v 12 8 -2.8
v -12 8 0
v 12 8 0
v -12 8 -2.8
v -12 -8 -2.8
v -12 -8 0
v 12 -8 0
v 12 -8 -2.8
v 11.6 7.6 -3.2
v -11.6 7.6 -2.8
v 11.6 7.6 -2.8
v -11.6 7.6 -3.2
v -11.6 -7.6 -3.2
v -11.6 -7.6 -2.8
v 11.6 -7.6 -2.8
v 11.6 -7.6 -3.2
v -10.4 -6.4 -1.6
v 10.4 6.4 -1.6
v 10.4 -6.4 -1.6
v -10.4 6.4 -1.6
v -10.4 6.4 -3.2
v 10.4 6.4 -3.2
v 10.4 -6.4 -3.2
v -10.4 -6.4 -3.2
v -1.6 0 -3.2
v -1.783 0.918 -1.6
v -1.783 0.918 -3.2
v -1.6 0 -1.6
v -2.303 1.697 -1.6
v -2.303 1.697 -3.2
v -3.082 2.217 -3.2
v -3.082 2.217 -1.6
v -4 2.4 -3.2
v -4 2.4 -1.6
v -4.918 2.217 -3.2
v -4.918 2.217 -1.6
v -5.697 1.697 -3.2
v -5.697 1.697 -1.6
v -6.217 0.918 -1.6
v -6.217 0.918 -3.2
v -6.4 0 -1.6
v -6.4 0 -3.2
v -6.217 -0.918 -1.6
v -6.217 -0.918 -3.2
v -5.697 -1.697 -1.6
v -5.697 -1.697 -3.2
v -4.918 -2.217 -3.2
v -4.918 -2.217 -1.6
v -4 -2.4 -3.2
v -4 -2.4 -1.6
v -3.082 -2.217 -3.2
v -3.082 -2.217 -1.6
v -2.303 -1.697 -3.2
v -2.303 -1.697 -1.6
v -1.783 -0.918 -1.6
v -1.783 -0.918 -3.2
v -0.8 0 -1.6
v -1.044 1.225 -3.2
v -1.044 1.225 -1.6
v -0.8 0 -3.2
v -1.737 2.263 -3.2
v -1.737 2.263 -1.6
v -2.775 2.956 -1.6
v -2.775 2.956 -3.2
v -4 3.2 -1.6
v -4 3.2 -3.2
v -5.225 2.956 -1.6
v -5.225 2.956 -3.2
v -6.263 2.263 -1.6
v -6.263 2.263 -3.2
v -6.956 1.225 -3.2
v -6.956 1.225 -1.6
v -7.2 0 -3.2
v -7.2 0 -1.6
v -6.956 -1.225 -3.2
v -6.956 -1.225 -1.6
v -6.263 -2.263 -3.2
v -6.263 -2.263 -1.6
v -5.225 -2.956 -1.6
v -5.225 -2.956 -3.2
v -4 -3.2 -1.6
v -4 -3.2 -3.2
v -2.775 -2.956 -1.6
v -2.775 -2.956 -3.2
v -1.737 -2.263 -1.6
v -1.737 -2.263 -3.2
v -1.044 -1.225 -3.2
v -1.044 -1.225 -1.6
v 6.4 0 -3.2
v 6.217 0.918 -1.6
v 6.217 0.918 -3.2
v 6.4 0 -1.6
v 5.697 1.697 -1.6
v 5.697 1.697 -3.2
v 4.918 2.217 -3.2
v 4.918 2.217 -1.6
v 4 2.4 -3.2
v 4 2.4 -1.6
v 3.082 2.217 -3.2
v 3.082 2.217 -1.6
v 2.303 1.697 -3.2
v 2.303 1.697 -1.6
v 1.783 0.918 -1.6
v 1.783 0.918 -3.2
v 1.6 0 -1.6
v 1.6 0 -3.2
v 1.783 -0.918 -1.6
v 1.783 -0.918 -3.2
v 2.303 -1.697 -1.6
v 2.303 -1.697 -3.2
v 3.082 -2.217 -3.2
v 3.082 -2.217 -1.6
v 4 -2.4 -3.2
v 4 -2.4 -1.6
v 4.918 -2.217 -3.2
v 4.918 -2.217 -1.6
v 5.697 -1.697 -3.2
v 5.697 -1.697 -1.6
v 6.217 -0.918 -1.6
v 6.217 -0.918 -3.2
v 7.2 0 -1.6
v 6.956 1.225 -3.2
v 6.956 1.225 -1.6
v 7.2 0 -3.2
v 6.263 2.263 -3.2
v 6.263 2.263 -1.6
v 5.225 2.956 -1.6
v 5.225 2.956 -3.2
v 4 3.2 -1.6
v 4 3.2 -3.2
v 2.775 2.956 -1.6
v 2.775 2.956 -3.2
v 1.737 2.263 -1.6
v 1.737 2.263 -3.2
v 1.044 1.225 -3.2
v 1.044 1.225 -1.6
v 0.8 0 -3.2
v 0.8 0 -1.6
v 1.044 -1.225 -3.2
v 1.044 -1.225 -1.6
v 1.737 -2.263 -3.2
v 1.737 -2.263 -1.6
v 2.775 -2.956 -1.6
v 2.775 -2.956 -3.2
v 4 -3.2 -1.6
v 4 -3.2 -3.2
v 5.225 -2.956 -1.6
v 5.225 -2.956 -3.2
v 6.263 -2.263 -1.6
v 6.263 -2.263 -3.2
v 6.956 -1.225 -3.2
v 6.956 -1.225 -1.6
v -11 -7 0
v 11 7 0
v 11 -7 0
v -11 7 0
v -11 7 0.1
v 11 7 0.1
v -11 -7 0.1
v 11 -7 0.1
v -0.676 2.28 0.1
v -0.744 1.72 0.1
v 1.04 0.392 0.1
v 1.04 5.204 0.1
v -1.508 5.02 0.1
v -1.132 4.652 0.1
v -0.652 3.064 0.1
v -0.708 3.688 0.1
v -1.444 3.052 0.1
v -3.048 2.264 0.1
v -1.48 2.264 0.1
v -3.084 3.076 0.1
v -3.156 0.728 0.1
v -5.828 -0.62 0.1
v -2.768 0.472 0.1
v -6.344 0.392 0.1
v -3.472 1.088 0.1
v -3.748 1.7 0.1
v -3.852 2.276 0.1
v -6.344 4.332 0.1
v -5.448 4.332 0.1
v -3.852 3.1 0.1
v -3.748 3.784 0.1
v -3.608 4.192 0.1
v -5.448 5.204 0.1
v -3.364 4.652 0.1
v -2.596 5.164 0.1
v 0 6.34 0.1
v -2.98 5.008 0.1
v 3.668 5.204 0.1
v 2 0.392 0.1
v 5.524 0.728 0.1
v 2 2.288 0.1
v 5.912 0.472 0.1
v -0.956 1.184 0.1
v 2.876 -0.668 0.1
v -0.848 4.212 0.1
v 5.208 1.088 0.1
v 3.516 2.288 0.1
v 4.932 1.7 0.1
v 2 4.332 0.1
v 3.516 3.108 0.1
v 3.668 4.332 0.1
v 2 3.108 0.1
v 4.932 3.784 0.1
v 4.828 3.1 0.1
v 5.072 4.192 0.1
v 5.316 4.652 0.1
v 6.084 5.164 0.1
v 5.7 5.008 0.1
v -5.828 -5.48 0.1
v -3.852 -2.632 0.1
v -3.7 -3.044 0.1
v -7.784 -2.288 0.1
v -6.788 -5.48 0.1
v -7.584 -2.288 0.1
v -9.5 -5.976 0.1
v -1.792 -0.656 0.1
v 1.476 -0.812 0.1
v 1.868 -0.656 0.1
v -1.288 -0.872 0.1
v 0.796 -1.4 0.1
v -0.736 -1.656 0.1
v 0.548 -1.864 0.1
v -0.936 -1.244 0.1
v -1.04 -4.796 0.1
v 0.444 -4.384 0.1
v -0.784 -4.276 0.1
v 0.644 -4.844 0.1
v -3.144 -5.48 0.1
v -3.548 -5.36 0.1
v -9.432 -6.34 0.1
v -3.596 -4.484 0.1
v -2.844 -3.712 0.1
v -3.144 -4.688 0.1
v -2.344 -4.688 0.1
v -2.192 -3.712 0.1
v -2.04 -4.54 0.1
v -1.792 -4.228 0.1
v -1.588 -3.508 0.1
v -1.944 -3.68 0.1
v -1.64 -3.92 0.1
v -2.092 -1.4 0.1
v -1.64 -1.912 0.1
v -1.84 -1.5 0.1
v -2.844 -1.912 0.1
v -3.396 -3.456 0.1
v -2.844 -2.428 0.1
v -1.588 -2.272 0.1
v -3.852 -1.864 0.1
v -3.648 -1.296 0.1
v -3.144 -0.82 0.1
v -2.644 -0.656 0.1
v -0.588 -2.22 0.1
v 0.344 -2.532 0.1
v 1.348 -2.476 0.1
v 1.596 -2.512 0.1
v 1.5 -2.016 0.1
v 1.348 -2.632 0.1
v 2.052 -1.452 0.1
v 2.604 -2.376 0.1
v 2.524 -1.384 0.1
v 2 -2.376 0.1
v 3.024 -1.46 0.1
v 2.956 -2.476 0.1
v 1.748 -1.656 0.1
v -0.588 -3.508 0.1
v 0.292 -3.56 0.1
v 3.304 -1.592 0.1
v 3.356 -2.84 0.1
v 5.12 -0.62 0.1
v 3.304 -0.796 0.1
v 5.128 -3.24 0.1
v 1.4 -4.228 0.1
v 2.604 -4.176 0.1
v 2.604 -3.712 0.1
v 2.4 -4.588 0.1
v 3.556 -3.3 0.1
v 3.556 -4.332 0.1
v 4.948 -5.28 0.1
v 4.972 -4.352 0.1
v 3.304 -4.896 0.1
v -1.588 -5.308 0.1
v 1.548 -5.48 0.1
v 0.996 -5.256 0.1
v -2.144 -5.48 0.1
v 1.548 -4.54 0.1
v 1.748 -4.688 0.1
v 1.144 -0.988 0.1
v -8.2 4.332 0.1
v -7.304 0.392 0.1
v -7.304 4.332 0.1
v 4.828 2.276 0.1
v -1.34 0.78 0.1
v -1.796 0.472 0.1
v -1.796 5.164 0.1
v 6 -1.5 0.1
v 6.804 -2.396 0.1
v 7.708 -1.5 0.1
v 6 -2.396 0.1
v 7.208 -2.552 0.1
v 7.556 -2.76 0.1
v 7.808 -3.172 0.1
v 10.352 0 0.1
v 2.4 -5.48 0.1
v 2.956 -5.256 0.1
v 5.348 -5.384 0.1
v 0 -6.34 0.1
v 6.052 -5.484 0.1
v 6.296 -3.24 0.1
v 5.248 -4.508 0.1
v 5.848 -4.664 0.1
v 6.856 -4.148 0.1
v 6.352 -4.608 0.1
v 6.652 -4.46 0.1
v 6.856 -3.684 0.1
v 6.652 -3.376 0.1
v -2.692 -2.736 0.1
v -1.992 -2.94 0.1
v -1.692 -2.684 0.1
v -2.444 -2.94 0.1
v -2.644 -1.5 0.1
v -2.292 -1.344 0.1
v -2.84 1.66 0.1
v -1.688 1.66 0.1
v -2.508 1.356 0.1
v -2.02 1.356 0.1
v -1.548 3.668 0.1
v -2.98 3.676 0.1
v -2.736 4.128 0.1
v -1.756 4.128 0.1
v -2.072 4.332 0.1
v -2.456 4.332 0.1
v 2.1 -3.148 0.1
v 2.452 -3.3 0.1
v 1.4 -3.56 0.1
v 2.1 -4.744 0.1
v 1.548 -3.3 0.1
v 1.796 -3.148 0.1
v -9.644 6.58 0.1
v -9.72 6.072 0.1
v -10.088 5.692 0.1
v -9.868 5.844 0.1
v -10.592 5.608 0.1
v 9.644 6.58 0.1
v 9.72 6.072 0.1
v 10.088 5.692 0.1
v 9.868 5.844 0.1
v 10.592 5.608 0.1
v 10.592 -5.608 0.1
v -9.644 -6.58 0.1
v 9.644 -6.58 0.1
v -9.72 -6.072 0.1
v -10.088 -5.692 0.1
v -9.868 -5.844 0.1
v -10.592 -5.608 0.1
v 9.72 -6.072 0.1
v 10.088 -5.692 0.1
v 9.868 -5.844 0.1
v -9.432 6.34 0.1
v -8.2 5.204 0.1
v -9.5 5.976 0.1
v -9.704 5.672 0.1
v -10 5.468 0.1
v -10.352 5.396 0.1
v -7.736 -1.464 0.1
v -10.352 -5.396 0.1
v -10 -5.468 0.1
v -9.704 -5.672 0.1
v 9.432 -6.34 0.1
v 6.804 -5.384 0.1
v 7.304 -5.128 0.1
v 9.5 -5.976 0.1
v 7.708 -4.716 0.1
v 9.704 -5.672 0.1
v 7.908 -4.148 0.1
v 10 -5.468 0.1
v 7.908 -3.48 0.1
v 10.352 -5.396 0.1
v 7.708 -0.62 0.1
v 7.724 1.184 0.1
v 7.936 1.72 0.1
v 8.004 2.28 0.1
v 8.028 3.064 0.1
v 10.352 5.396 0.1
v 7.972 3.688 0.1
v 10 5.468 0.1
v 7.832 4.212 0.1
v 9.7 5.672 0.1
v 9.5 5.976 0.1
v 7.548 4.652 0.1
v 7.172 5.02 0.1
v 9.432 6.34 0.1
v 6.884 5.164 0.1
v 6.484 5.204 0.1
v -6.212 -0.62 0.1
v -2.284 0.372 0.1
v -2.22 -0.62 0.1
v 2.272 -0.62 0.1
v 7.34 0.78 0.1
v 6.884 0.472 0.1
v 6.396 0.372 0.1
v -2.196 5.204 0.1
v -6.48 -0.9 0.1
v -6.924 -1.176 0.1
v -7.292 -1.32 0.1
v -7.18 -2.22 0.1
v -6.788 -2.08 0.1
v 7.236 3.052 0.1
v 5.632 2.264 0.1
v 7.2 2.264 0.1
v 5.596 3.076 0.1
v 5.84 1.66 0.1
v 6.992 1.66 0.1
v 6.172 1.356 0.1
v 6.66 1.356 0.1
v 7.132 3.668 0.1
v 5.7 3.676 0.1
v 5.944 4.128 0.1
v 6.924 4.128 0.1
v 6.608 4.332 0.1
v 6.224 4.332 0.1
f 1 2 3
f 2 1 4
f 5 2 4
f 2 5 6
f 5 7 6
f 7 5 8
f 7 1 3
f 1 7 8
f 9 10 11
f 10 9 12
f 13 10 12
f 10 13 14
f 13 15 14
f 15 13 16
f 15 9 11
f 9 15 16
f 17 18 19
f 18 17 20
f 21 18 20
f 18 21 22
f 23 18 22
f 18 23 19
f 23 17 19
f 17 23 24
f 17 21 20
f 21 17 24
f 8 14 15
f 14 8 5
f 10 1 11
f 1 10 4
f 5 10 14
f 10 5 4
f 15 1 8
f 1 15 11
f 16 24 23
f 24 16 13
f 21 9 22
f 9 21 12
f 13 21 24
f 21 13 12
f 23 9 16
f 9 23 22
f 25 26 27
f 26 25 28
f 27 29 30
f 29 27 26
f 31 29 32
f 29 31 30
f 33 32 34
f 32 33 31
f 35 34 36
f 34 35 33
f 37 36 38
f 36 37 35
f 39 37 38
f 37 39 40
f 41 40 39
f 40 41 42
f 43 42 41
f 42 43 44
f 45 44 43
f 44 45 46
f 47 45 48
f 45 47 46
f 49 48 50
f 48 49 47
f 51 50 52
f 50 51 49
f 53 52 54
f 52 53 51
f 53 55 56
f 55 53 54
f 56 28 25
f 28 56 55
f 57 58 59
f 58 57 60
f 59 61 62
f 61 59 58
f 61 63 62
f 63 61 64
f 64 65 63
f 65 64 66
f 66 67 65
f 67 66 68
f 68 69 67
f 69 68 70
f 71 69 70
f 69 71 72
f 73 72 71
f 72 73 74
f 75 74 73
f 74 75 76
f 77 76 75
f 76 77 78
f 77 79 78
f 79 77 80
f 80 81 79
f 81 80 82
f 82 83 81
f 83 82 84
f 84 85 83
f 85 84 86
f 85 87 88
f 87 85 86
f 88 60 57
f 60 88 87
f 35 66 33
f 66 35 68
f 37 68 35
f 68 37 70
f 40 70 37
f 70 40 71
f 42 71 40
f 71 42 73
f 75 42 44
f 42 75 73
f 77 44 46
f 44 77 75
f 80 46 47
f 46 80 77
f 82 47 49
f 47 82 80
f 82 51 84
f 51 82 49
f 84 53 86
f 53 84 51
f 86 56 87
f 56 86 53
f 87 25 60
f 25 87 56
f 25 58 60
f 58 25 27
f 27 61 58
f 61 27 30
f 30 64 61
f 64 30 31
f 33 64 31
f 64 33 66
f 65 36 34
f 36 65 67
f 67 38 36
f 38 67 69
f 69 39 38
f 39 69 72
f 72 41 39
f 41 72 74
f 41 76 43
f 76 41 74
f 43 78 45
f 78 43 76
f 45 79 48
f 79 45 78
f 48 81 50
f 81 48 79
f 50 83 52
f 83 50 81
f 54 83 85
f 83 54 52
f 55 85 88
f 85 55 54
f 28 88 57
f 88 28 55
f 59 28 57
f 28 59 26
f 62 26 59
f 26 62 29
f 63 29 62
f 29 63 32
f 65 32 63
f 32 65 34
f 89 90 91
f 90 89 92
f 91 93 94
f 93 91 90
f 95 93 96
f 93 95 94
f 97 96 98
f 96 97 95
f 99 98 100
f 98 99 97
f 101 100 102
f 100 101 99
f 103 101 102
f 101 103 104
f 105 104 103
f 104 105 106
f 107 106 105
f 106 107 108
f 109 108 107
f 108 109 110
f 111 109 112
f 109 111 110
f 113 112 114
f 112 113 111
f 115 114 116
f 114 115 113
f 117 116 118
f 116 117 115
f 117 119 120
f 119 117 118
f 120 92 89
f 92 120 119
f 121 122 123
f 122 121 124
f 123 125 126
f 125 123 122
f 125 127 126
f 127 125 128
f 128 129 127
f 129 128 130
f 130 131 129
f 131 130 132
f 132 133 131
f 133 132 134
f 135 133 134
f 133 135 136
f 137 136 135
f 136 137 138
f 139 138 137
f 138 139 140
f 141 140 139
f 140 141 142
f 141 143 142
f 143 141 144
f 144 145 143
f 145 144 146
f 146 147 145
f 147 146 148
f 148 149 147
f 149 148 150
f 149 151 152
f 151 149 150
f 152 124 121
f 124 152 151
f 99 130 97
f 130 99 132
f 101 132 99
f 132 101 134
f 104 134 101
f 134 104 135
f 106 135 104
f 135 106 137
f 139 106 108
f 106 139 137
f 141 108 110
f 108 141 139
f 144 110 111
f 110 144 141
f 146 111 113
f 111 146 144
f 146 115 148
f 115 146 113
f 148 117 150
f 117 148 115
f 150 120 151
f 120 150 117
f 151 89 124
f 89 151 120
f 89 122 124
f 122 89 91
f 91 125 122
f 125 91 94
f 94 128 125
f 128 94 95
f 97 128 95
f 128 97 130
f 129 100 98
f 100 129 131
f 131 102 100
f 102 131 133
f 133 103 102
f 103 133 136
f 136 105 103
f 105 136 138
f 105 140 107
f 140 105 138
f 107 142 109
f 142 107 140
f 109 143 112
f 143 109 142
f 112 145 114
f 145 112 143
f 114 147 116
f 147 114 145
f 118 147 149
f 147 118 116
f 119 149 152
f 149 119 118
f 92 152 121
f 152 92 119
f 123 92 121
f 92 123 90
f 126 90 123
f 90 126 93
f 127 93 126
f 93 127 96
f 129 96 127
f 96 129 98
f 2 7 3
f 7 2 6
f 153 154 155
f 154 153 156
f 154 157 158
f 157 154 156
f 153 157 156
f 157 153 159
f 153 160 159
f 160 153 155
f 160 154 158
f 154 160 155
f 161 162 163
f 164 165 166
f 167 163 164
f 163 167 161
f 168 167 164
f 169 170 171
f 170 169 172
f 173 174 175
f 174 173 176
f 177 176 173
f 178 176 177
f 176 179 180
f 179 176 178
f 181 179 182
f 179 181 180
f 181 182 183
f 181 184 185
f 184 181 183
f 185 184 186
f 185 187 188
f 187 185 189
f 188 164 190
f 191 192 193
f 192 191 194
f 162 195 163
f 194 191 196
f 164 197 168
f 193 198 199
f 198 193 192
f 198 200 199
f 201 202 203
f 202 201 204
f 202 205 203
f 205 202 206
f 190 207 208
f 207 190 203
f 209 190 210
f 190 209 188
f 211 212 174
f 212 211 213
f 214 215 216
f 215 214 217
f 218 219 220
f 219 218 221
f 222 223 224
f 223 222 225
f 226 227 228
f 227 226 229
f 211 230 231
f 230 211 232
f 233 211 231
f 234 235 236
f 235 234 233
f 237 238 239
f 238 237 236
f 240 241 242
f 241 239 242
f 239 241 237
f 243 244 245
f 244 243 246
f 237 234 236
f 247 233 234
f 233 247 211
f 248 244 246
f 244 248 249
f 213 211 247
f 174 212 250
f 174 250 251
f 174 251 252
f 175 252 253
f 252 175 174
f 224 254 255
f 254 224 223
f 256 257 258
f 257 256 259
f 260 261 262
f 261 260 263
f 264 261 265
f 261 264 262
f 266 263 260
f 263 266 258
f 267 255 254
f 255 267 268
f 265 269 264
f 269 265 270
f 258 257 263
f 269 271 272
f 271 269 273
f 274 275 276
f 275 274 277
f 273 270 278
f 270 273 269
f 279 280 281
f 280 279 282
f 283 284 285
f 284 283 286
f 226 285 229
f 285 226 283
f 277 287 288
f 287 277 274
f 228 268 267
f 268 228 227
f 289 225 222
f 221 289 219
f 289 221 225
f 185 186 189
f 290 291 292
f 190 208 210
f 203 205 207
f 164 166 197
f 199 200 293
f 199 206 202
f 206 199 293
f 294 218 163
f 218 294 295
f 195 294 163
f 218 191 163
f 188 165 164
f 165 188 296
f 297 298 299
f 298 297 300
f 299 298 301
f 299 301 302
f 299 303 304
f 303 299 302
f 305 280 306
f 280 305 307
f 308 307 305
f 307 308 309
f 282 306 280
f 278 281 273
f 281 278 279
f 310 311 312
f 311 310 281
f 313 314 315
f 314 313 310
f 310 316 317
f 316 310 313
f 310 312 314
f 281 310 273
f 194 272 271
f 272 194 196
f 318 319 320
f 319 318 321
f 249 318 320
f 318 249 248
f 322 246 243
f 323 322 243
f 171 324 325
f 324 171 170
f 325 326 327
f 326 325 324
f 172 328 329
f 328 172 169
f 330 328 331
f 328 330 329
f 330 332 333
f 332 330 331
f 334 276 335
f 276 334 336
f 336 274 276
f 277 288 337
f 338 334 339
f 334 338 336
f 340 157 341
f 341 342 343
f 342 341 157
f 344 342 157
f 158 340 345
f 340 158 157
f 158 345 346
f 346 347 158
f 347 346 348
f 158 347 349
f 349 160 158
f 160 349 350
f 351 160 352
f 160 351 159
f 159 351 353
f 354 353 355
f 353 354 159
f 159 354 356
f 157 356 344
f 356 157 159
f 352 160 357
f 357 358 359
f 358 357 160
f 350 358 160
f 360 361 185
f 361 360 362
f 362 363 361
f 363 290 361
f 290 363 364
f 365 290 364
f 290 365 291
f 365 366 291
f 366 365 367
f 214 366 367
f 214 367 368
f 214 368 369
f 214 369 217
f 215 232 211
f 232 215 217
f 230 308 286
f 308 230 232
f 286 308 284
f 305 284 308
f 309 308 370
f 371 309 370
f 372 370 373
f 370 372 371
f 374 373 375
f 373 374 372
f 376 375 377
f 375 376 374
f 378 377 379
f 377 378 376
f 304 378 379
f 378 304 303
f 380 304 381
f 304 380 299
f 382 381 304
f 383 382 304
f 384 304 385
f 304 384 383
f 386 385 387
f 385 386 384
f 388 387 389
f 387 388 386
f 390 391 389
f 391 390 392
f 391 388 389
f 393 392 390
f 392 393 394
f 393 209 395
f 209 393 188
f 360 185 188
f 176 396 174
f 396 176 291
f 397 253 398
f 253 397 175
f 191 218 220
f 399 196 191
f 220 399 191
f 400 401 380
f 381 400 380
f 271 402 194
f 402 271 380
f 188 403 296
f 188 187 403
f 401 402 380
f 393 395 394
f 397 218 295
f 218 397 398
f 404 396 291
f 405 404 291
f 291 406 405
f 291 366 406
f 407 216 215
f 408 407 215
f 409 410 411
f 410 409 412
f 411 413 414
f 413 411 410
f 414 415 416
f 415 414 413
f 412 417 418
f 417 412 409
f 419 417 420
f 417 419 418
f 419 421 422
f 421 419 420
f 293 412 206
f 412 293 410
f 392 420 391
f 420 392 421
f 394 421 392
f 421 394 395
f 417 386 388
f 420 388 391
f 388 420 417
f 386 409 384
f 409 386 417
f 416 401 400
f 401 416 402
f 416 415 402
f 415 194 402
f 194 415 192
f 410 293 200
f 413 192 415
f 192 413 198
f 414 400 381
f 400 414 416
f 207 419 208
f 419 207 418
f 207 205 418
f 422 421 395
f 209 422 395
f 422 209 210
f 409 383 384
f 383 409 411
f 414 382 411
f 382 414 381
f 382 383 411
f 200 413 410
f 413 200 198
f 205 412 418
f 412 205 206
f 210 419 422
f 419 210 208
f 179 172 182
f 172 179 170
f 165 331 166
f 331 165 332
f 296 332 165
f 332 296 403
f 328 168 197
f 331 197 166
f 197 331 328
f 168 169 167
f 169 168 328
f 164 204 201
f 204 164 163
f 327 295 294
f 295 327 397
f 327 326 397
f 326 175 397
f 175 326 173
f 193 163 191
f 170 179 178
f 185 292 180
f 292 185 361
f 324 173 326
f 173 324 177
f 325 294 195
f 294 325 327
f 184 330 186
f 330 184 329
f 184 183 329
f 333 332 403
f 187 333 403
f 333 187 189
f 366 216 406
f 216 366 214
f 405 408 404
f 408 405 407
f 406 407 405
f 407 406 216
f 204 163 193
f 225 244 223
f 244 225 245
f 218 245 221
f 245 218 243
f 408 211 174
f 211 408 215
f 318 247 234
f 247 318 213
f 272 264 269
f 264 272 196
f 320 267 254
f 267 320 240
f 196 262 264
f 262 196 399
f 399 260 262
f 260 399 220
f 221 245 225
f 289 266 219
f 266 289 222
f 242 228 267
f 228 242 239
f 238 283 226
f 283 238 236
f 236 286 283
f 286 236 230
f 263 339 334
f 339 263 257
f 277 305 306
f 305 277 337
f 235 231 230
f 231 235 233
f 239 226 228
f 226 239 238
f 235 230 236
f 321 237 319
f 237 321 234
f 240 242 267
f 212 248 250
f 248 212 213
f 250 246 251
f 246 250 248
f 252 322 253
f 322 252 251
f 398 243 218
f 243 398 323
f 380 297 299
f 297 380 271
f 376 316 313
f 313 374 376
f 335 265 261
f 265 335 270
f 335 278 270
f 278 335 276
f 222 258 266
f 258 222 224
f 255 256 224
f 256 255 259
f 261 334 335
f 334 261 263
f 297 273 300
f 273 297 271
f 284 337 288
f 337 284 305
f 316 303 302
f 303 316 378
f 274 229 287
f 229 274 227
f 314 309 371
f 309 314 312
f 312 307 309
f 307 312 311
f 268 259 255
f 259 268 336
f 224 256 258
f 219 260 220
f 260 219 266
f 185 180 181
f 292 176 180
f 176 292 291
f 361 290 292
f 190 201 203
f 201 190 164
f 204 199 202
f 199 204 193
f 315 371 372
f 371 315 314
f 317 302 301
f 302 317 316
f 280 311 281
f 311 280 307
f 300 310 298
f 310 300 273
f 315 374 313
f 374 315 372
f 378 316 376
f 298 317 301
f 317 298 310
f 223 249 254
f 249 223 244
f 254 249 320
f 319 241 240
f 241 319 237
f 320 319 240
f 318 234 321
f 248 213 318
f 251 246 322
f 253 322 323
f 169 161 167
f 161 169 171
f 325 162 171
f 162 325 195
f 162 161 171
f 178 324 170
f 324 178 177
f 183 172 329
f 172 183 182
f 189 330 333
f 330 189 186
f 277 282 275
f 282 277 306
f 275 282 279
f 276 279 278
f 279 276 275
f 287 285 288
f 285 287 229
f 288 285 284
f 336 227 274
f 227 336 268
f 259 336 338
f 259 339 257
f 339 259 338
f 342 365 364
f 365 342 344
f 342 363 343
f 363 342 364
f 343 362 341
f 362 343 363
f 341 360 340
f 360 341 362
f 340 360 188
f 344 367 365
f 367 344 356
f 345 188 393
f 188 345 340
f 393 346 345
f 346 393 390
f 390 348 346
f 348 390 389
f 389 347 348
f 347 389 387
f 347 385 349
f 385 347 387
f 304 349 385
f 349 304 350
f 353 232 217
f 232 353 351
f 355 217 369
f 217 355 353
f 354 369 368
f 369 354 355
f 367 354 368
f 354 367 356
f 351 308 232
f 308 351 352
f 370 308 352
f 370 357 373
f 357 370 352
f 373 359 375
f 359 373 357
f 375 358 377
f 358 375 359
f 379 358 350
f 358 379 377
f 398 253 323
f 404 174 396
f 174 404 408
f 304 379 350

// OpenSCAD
use <../lib.scad>
use <26603.scad>
use <6296256m.scad>
function ldraw_lib__26603d0n() = [
// 0 Tile  2 x  3 with White "TOFO 1965" on Black Background Sticker
// 0 Name: 26603d0n.dat
// 0 Author: Evert-Jan Boer [ejboer]
// 0 !LDRAW_ORG Shortcut UPDATE 2026-07
// 0 !LICENSE Licensed under CC BY 4.0 : see CAreadme.txt
// 
// 0 BFC CERTIFY CCW
  [0,"BFC","CERTIFY"],
  [0,"BFC","CCW"],
// 
// 0 !CATEGORY Sticker Shortcut
// 0 !KEYWORDS Bricklink 26603pb145, Fiat 500, set 10271, set 77942
// 
// 0 !HISTORY 2026-07-30 [OrionP] Official Update 2026-07
// 
// 1 16 0 0 0 1 0 0 0 1 0 0 0 1 26603.dat
  [1,16,0,0,0,1,0,0,0,1,0,0,0,1, ldraw_lib__26603()],
// 1 16 0 0 0 1 0 0 0 1 0 0 0 1 6296256m.dat
  [1,16,0,0,0,1,0,0,0,1,0,0,0,1, ldraw_lib__6296256m()],
];
module ldraw_lib__26603d0n(step=0, col=false, unit=2/5, alt=false, line=0.2, solid=!$preview)
    makepoly(ldraw_lib__26603d0n(), step=step, col=col, unit=unit, alt=alt, line=line, solid=solid);
ldraw_lib__26603d0n(line=0.2);
